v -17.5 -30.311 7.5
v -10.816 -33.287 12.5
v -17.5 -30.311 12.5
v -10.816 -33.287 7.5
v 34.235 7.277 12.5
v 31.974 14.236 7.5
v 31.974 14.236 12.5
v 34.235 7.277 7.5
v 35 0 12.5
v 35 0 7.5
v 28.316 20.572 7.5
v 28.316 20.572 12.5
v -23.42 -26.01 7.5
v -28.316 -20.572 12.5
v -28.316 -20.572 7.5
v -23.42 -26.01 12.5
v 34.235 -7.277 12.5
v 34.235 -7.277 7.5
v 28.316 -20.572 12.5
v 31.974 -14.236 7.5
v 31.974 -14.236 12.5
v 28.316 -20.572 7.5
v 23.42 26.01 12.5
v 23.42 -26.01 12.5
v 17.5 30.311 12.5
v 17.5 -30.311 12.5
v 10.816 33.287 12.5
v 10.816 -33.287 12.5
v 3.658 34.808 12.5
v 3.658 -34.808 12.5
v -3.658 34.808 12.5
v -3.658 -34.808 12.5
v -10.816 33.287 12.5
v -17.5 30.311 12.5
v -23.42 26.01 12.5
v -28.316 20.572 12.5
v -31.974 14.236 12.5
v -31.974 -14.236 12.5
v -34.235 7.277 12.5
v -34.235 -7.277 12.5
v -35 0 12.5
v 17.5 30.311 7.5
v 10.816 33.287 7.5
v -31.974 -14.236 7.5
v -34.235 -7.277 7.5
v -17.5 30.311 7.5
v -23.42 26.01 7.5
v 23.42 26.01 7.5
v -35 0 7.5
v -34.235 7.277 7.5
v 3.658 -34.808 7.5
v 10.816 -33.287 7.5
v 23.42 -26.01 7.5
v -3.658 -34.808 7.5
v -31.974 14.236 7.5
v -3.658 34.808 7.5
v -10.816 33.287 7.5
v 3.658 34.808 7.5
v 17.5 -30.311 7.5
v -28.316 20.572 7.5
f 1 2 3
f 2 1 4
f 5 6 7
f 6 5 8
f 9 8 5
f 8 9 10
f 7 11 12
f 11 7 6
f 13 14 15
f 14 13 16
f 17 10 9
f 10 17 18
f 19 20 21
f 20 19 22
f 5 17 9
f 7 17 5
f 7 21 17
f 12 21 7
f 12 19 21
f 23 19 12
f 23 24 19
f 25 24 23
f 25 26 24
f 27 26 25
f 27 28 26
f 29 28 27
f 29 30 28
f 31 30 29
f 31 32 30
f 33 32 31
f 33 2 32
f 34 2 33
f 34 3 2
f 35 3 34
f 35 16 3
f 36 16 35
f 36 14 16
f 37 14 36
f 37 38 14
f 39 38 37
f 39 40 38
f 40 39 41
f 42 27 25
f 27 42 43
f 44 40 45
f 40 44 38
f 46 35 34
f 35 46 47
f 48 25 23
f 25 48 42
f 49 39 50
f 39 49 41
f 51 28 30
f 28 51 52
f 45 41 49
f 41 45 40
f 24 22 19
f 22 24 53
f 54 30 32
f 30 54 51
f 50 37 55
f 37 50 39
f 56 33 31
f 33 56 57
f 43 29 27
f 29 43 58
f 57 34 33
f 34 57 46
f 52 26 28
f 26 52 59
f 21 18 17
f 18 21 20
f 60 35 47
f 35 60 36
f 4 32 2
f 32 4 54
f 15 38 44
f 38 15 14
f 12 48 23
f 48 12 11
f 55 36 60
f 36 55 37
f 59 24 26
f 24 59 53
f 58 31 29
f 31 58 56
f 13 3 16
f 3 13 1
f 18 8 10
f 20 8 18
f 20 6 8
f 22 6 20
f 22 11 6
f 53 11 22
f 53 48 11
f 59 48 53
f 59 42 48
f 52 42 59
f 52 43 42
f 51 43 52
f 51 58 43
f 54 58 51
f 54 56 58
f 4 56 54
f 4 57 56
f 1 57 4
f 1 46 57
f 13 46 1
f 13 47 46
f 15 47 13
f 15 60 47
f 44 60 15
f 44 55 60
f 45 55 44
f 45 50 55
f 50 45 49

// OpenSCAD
//
//   Code generated by ChatGPT for the query below
//
//   Can you write me OpenSCAD code to create a model of a frying pan?
//
//   Created Jan 2023 by Jenny List, for a Hackaday article.
//


module frying_pan() {
  difference() {
    union() {
      cylinder(r=30, h=10, center=true);
      translate([0, 0, 10]) cylinder(r=35, h=5, center=true);
    }
    cylinder(r=38, h=12, center=true);
  }
}

frying_pan();
